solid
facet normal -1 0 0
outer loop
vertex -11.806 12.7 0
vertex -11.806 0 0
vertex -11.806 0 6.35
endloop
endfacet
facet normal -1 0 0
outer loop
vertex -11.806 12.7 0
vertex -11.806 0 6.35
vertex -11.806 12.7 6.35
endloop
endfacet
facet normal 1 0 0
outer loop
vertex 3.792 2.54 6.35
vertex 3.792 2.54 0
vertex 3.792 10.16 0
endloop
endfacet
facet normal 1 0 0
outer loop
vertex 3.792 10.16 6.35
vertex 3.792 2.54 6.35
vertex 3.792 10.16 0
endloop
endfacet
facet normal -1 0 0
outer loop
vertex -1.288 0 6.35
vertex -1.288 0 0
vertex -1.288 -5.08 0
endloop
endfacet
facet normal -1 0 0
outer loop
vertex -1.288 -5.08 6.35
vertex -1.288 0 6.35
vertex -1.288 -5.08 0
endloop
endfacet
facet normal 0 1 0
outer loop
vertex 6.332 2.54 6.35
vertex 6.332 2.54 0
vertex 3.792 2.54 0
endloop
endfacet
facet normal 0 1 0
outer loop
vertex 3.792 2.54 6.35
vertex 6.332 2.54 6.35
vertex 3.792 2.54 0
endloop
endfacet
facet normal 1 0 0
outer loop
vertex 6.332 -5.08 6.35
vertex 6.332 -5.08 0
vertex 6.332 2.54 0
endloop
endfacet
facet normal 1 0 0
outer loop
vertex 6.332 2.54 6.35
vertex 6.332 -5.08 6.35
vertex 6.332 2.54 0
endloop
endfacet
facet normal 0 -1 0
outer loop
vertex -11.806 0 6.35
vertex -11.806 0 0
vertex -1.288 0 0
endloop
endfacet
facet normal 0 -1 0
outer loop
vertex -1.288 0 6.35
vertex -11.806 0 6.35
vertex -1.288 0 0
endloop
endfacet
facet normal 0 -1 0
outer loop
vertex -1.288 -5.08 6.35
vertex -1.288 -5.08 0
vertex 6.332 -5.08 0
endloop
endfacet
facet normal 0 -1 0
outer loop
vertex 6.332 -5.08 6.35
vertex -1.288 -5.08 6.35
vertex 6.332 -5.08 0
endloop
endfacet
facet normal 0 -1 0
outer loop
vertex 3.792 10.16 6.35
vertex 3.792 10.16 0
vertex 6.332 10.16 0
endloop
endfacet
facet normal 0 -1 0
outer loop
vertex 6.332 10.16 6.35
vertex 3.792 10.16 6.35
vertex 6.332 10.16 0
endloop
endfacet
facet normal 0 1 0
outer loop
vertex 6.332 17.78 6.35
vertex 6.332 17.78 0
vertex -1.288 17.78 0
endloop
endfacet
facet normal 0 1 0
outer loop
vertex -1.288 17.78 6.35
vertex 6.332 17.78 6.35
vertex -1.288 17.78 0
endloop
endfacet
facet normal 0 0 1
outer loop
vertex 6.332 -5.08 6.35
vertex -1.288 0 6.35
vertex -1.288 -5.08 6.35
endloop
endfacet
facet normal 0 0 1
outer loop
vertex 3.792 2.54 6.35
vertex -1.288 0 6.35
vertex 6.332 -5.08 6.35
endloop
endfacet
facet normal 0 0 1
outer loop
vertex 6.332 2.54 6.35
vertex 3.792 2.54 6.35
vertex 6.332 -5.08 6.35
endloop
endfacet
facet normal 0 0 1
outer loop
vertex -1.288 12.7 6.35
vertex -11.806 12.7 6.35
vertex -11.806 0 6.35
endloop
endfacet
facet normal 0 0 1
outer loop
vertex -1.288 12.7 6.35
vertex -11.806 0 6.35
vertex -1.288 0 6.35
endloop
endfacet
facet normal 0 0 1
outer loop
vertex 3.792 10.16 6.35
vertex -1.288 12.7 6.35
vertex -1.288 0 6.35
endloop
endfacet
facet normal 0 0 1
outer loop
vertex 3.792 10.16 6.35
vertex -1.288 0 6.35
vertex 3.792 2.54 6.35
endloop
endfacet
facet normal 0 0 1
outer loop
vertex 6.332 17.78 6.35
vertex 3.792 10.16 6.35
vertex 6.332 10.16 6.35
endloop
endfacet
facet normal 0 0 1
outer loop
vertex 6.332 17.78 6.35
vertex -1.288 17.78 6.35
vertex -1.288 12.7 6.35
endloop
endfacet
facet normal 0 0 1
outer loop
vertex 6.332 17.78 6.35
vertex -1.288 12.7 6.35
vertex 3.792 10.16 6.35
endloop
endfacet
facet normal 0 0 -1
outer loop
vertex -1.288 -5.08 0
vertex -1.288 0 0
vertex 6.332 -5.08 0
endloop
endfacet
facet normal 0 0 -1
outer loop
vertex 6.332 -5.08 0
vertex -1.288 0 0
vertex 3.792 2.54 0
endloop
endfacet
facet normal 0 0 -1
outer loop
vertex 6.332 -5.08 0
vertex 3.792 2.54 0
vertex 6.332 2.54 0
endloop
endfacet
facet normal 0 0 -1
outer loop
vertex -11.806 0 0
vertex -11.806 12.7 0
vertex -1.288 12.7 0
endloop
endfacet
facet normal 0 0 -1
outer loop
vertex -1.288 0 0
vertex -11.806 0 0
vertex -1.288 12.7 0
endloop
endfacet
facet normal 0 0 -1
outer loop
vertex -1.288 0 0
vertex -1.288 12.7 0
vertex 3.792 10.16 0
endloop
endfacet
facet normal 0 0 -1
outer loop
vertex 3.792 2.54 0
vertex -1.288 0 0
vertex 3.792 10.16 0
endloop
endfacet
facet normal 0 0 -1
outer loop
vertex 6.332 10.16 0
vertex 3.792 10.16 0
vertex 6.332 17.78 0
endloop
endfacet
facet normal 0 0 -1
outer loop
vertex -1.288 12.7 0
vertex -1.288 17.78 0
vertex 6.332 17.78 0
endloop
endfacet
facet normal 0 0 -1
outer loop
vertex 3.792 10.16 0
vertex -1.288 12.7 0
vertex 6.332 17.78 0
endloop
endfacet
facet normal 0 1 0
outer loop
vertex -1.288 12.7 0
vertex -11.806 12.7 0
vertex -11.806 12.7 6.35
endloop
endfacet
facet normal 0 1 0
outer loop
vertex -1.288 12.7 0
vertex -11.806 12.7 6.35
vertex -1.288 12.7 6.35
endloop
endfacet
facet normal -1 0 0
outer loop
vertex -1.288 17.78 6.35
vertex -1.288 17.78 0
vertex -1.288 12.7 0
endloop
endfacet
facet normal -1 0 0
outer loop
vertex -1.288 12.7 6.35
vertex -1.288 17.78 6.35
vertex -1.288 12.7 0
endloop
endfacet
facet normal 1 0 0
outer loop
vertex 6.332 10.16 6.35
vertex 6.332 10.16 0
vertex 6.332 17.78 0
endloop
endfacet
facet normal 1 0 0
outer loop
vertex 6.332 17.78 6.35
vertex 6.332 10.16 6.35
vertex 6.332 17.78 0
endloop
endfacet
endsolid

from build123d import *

# Parameters (mm, degrees)
F0_W     = 10.517747
F0_H     = 12.7
F1_DEPTH = 6.35


with BuildPart() as f1:
    # F0 (on Top) → F1 (new body)
    with BuildSketch(Plane.XY):
        with Locations((-6.54676, 6.35)):
            Rectangle(F0_W, F0_H)
        Polygon((-1.287887, 12.7), (-1.287887, 0), (-1.287887, -5.08), (6.332113, -5.08), (6.332113, 2.54), (3.792113, 2.54), (3.792113, 10.16), (6.332113, 10.16), (6.332113, 17.78), (-1.287887, 17.78), align=None)
    extrude(amount=F1_DEPTH)


solid = f1.part
